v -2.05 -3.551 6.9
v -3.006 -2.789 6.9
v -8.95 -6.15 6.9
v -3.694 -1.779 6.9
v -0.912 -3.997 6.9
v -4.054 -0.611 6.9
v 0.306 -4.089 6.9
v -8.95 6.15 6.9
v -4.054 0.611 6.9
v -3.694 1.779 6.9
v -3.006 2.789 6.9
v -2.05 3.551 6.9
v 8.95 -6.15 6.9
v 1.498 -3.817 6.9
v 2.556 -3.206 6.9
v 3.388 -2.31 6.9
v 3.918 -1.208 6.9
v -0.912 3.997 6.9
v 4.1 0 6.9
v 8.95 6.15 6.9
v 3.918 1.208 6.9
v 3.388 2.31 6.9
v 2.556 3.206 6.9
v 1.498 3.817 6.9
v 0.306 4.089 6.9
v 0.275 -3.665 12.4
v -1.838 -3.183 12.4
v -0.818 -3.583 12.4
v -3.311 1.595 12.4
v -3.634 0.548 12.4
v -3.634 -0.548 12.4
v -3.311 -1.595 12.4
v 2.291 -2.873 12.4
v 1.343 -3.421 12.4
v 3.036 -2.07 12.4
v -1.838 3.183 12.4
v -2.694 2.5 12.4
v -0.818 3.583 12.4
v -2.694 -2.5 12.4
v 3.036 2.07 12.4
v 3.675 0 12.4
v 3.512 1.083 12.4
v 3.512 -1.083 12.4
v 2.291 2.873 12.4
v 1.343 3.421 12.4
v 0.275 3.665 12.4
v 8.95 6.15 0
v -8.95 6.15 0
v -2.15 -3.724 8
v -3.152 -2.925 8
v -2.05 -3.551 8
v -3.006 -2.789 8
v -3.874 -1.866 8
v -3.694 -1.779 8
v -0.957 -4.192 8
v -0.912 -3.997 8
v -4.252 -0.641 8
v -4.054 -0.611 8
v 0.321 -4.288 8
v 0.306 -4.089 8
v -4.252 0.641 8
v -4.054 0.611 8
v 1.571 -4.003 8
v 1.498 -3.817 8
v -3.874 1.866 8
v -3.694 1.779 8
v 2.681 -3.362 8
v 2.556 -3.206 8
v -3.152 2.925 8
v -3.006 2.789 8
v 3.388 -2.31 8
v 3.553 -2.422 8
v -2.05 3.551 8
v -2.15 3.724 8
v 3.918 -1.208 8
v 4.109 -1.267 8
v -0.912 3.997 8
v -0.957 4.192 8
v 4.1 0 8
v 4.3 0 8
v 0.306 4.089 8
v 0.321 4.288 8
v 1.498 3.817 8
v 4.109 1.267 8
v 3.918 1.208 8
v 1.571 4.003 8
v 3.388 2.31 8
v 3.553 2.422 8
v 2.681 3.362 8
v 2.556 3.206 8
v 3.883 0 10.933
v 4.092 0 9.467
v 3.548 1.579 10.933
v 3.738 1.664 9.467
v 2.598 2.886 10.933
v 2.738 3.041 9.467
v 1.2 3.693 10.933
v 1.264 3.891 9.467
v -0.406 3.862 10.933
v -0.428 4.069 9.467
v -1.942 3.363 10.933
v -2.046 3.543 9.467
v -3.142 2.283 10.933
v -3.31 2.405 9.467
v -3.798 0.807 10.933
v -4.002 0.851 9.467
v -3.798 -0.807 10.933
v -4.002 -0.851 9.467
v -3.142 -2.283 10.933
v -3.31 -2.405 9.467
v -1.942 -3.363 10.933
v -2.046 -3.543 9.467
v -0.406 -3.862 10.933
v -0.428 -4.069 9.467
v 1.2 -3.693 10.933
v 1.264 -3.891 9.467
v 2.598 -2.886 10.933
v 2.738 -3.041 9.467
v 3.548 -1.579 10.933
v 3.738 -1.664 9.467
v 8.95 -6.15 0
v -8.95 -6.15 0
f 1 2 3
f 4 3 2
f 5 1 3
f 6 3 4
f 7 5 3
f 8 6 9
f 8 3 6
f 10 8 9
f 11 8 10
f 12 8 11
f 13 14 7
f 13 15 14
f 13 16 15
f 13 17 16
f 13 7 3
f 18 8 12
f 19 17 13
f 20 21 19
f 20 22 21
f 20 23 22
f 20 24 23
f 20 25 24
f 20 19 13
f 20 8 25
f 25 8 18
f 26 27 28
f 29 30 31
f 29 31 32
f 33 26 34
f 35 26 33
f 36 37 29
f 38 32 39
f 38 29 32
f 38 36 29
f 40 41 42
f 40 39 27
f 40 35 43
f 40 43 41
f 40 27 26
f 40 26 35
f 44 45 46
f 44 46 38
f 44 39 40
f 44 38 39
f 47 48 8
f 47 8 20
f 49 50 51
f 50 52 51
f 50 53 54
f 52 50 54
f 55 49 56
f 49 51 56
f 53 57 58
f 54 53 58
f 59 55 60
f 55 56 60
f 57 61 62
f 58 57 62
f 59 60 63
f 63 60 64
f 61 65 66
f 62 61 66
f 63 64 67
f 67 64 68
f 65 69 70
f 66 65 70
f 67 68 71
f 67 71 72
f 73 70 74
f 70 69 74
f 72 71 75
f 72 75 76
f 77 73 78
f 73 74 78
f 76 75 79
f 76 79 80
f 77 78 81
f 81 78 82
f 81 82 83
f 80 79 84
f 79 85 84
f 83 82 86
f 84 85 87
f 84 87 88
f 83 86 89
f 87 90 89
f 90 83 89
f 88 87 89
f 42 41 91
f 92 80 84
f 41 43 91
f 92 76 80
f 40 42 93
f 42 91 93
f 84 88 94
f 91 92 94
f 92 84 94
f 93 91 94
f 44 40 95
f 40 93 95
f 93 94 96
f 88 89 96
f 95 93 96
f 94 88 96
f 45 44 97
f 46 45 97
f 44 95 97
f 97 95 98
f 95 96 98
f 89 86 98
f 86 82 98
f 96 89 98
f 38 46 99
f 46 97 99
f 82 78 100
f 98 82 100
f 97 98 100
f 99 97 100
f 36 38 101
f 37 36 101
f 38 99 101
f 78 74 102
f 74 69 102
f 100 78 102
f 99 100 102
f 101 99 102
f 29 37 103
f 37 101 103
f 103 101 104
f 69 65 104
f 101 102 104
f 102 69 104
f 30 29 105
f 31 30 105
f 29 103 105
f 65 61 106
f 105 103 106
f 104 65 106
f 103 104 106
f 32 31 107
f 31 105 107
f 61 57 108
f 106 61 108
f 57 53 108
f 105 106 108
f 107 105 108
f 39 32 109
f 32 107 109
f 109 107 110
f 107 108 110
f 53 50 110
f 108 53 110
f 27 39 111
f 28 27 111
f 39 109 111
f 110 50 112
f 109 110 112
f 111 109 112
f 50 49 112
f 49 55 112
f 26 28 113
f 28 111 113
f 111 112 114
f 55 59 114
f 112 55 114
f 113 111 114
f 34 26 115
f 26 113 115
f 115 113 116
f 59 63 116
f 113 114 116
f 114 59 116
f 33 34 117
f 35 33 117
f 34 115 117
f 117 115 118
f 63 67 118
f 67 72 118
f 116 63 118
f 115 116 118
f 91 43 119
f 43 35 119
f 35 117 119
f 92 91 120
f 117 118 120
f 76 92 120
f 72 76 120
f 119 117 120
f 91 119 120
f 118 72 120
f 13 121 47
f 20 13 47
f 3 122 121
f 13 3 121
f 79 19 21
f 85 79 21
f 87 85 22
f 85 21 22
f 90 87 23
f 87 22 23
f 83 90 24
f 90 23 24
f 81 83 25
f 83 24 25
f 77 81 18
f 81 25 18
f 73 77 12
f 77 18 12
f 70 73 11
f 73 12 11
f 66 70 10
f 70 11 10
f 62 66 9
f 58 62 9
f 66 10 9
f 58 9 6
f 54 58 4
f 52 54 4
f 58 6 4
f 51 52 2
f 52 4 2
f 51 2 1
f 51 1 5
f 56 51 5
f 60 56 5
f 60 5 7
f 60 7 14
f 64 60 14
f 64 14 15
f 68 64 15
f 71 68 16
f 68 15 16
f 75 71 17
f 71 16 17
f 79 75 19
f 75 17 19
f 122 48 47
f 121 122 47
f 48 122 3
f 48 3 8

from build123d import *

# Parameters (mm, degrees)
F0_W     = 17.9
F0_H     = 12.3
F1_DEPTH = 6.9
F2_R     = 4.1
F3_DEPTH = 1.1
F7_R     = 3.675
F4_R     = 4.3


with BuildPart() as f1:
    # F0 (on Top) → F1 (new body)
    with BuildSketch(Plane.XY):
        Rectangle(F0_W, F0_H)
    extrude(amount=F1_DEPTH)

    # F2 (on face) → F3 (join)
    with BuildSketch(Plane.XY.offset(6.9)):
        Circle(F2_R)
    extrude(amount=F3_DEPTH)

    # F7 (on plane+point) → F8 section 0
    with BuildSketch(Plane.XY.offset(12.4)):
        Circle(F7_R)
    # F4 (on face) → F8 section 1
    with BuildSketch(Plane.XY.offset(8)):
        Circle(F4_R)
    loft()


solid = f1.part
